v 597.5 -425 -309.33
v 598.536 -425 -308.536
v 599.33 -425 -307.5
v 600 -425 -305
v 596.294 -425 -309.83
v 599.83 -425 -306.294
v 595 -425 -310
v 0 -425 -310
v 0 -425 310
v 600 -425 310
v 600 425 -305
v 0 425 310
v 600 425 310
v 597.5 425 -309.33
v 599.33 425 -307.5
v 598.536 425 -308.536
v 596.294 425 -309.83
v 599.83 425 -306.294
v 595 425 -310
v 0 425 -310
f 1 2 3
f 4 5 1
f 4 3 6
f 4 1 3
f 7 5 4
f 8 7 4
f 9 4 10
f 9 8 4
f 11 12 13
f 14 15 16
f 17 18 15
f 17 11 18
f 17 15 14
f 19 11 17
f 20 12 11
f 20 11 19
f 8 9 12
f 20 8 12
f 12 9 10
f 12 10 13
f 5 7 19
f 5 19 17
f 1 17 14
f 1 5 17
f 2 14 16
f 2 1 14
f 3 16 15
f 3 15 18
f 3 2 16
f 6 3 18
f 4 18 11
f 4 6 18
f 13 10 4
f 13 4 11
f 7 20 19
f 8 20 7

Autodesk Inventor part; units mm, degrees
ref_plane "YZ Plane" through (0, 0, 0) normal (1, 0, 0) x (0, 1, 0)
ref_plane "XZ Plane" through (0, 0, 0) normal (0, 1, 0) x (-1, 0, 0)
ref_plane "XY Plane" through (0, 0, 0) normal (0, 0, 1) x (1, 0, 0)
sketch "草图1" plane through (0, 0, 0) normal (1, 0, 0) x (0, 1, 0)
  line L0 (425, -310) -> (-425, -310)
  line L1 (-425, -310) -> (-425, 310)
  line L2 (-425, 310) -> (425, 310)
  line L3 (425, 310) -> (425, -310)
  line L4 (425, -310) -> (-425, 310) construction
  line L5 (-425, -310) -> (425, 310) construction
  point P0 (0, 0)
  dimension "d0" = 850
  dimension "d1" = 620
extrude "拉伸1" add sketch "草图1" along normal blind 600
fillet "圆角1" radius 5 1 edges at (600, 0, -310)
properties part number "fridge"
